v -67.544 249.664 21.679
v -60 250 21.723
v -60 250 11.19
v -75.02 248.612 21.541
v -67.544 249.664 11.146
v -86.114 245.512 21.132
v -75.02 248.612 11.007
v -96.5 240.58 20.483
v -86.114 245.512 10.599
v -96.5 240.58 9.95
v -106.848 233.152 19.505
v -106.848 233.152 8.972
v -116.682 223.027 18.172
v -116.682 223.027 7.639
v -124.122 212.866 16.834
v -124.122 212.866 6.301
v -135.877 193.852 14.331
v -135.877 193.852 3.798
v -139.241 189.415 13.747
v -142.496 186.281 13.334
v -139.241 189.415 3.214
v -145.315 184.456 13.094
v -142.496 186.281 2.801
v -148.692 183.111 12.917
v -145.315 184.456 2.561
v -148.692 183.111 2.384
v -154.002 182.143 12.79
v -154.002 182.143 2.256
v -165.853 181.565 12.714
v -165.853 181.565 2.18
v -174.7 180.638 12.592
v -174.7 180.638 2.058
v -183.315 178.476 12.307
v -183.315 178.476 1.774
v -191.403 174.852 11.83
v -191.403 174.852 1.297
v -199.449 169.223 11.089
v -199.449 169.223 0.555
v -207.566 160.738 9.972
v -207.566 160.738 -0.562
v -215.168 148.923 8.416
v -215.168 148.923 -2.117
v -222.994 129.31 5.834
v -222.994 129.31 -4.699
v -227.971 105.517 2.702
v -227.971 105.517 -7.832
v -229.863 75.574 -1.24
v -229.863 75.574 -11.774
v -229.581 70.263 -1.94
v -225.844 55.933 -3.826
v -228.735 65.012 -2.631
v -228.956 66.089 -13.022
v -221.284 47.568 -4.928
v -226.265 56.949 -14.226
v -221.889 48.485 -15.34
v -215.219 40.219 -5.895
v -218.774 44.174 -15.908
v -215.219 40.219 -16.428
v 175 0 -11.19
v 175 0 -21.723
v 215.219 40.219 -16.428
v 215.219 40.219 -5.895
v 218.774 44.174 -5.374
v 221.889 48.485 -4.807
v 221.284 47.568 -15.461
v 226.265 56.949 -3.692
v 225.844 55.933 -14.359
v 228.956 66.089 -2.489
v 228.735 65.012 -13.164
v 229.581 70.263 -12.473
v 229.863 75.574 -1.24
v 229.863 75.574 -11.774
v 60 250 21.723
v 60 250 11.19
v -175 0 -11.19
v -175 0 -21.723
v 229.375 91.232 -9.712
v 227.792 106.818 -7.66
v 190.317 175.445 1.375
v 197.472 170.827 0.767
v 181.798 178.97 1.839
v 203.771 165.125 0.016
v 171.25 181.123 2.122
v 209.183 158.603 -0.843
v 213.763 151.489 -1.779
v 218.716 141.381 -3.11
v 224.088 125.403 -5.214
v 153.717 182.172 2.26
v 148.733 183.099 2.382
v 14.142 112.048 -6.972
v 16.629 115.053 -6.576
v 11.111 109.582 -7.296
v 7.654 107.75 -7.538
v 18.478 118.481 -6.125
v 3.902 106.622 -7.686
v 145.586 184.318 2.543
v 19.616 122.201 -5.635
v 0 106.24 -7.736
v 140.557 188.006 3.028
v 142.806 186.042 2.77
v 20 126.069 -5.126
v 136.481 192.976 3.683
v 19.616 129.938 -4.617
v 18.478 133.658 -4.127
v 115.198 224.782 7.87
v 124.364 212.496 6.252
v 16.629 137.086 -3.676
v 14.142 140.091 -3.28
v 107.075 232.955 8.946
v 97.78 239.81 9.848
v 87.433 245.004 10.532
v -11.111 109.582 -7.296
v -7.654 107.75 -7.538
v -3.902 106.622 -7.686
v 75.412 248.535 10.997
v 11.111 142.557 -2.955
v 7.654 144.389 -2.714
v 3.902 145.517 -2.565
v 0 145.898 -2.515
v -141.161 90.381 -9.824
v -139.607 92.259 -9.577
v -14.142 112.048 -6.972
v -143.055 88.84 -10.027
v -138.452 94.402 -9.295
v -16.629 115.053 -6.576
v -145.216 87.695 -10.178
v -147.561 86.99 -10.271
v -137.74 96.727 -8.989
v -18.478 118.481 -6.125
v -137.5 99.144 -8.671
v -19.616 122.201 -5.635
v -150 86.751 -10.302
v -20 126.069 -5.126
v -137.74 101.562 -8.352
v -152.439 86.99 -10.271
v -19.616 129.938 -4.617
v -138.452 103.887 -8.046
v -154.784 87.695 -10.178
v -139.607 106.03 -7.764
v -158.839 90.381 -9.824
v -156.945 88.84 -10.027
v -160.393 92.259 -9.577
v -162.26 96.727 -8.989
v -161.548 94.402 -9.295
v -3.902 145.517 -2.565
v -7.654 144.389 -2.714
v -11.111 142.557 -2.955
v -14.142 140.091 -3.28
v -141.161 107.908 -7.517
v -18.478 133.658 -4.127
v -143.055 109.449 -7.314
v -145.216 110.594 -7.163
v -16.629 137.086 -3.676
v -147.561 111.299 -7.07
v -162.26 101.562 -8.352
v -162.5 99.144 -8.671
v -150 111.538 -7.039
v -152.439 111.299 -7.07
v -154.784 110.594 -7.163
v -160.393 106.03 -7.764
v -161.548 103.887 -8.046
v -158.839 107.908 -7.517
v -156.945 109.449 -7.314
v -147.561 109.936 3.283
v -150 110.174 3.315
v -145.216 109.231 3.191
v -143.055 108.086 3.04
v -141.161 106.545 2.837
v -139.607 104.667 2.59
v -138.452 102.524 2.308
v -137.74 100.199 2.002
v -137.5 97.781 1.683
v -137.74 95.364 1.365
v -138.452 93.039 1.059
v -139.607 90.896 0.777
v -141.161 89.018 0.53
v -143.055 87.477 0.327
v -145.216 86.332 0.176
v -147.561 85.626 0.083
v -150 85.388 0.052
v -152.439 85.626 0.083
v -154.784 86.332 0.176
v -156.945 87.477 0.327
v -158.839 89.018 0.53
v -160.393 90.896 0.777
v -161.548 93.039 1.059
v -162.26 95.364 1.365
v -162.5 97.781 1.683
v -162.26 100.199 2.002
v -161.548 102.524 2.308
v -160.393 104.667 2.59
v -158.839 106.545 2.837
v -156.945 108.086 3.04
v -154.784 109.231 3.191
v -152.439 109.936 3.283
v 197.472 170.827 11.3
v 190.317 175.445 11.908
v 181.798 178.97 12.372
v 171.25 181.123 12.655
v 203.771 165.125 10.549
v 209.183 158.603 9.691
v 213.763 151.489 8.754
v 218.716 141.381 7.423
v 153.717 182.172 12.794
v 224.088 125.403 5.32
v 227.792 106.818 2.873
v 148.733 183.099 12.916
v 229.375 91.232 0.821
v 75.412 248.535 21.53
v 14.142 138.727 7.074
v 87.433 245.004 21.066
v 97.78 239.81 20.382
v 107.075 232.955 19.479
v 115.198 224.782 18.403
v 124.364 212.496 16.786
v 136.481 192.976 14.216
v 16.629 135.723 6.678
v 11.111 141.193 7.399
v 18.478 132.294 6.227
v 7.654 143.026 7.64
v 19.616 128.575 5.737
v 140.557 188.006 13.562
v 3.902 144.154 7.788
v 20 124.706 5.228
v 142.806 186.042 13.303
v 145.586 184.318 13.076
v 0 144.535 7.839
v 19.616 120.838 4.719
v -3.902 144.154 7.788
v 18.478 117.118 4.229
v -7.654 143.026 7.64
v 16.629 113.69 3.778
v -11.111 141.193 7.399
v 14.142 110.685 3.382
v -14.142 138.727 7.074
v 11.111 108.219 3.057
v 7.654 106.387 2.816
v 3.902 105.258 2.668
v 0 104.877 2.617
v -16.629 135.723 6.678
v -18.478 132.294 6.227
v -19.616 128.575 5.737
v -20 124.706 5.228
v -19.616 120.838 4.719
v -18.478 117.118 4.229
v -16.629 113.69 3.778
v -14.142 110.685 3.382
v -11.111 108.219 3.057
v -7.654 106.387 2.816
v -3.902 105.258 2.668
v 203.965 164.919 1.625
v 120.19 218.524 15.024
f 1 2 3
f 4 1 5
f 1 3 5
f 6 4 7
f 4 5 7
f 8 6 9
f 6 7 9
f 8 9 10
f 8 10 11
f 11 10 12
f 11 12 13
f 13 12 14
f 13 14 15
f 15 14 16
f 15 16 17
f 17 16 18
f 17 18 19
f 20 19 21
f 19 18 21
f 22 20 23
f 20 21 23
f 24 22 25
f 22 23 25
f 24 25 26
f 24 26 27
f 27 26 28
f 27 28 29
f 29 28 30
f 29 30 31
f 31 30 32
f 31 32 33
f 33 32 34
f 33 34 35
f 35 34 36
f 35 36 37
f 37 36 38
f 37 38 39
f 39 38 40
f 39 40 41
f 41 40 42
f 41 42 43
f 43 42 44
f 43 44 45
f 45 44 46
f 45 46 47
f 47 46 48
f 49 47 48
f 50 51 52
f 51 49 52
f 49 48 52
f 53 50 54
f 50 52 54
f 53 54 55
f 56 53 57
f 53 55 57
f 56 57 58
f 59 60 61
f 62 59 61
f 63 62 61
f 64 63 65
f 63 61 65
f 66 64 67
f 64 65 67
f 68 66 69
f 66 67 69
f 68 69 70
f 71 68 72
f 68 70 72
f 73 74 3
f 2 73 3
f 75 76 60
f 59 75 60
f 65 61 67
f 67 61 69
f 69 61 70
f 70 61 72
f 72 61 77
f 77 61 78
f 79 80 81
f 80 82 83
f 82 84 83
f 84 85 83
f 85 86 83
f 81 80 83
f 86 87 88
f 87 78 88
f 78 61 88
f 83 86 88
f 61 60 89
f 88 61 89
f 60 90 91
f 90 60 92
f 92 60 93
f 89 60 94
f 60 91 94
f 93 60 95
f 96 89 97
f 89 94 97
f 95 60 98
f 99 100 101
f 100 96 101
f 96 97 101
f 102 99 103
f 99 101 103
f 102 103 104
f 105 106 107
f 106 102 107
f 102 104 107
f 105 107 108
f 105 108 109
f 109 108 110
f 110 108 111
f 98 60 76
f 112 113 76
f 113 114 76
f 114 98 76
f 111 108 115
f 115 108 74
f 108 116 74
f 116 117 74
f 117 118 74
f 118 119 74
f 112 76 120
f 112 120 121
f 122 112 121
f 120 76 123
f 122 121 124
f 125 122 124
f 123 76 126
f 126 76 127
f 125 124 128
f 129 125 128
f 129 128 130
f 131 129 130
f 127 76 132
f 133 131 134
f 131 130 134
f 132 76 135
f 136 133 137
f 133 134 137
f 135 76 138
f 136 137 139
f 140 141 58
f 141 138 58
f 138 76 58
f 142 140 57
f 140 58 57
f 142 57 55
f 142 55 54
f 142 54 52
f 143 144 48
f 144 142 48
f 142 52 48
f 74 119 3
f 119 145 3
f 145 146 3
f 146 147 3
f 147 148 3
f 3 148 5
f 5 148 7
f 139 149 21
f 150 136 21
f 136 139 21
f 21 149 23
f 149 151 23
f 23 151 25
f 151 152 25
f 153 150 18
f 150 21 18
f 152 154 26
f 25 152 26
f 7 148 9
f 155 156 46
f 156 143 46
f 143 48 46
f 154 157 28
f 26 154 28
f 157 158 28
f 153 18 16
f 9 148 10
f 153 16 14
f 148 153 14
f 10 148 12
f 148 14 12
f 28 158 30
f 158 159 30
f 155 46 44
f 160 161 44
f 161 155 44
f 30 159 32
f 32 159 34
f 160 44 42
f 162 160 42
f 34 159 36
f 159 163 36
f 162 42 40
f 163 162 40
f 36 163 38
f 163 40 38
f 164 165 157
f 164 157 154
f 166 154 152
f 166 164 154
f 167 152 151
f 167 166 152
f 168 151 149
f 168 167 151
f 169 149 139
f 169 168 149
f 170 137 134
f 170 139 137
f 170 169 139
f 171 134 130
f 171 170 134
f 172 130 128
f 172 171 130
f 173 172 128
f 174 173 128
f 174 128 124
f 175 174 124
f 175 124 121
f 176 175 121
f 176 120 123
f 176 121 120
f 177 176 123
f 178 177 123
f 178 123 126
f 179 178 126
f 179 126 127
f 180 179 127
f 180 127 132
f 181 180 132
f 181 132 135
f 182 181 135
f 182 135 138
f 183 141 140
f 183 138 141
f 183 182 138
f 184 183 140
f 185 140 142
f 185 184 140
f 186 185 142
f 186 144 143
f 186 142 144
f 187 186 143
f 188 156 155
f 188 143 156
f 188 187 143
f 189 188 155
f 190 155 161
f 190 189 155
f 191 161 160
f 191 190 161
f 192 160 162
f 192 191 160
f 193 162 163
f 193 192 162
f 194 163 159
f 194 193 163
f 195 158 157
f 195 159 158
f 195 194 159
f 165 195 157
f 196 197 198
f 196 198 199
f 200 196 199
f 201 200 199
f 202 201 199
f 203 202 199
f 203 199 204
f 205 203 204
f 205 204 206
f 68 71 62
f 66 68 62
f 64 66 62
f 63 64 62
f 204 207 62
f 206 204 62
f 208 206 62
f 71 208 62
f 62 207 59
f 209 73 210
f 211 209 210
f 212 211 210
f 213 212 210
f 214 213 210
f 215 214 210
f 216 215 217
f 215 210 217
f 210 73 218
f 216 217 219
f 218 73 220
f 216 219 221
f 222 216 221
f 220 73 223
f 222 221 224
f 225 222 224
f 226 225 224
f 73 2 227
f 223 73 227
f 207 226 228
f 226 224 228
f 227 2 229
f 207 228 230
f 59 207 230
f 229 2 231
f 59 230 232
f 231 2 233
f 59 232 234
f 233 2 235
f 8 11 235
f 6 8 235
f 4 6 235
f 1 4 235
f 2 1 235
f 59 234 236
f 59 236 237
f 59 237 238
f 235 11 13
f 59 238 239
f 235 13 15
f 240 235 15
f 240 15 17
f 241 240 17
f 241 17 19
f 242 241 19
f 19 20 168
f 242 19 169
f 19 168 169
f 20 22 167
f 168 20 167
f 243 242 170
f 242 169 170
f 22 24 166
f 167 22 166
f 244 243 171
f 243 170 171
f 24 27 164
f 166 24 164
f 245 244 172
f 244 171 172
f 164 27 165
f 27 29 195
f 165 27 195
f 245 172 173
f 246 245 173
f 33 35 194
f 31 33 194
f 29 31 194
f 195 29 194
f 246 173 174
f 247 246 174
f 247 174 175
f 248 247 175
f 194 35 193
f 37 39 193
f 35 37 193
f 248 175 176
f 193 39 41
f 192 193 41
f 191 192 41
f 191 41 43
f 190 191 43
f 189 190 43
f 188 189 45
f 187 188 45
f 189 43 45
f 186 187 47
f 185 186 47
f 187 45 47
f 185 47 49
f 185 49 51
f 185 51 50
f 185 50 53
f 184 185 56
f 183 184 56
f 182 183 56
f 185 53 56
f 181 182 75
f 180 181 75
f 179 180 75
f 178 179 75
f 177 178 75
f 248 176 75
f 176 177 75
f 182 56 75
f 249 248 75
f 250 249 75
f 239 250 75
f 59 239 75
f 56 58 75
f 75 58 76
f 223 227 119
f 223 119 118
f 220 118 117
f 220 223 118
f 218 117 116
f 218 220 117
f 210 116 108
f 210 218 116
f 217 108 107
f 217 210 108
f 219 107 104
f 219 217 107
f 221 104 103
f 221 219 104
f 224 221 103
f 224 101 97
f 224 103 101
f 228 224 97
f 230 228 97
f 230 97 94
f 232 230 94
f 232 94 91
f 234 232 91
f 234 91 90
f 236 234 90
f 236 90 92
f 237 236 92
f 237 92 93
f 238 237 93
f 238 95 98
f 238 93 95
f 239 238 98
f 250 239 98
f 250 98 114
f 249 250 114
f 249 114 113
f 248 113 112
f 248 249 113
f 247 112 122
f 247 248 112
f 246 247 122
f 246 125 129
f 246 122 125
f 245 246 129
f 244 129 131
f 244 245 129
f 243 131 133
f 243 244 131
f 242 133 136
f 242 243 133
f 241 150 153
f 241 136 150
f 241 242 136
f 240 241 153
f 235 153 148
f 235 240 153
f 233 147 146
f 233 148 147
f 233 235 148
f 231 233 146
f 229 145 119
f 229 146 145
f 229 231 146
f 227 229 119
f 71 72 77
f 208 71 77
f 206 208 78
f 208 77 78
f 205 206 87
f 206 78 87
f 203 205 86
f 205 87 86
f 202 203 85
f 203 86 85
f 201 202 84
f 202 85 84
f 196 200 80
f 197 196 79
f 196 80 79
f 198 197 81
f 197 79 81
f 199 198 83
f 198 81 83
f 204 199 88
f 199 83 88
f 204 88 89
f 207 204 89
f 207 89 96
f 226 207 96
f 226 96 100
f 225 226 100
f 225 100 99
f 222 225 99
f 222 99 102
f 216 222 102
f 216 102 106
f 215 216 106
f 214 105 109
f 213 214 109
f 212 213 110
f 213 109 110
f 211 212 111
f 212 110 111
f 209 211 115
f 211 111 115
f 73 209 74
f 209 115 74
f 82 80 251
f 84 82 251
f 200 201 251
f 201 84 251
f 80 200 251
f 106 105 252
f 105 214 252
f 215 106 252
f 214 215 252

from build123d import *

# Parameters (mm, degrees)
BOSS_EXTRUDE1_START     = -25
BOSS_EXTRUDE1_DEPTH     = 50
CUT_EXTRUDE1_DEPTH      = 341.53226913
CUT_EXTRUDE1_DEPTH_BACK = 341.53226913
CUT_EXTRUDE2_DEPTH      = 341.286795308
CUT_EXTRUDE2_DEPTH_BACK = 341.286795308
SKETCH4_R               = 20
CUT_EXTRUDE3_DEPTH      = 341.286795308
CUT_EXTRUDE3_DEPTH_BACK = 341.286795308
SKETCH6_R               = 12.5


# Read off the part's stored shape, not the designer's step: Boss-Extrude1
with BuildPart() as part:
    # Boss-Extrude1 outline → Boss-Extrude1 (new body)
    with BuildSketch(Plane.XY.offset(BOSS_EXTRUDE1_START)):
        with BuildLine():
            Line((175, 0), (215.218833807, 40.218833807))
            ThreePointArc((215.218833807, 40.218833807), (226.057471223, 56.440000887), (229.863494748, 75.574172084))
            add(Edge.make_bspline(
                [(229.863494748, 75.574172084), (229.863497015, 220.574172084), (130.657195822, 208), (130.657198498, 108), (160, 250), (60, 250)],
                knots=[0, 0, 0, 0, 0, 0, 1, 1, 1, 1, 1, 1], degree=5))
            Line((60, 250), (-60, 250))
            add(Edge.make_bspline(
                [(-60, 250), (-160, 250), (-130.657198498, 108), (-130.657195822, 208), (-229.863497015, 220.574172084), (-229.863494748, 75.574172084)],
                knots=[0, 0, 0, 0, 0, 0, 1, 1, 1, 1, 1, 1], degree=5))
            ThreePointArc((-229.863494748, 75.574172084), (-226.057471223, 56.440000887), (-215.218833807, 40.218833807))
            Line((-215.218833807, 40.218833807), (-175, 0))
            Line((-175, 0), (175, 0))
        make_face()
    extrude(amount=BOSS_EXTRUDE1_DEPTH)

    # Sketch2 → Cut-Extrude1 (cut, two sides: drawn at the far end of the back side and taken through both)
    with BuildSketch(Plane(origin=(0, 0, 0), x_dir=(0, 0, -1), z_dir=(1, 0, 0)).offset(-CUT_EXTRUDE1_DEPTH_BACK)):
        Polygon((23.039732542, -10), (-12.506441807, 260), (35, 260), (35, -10), align=None)
        Polygon((-23.039732542, 260), (12.506441807, -10), (-35, -10), (-35, 260), align=None)
    extrude(amount=CUT_EXTRUDE1_DEPTH + CUT_EXTRUDE1_DEPTH_BACK, mode=Mode.SUBTRACT)

    # Sketch4 → Cut-Extrude2 (cut, two sides: drawn at the far end of the back side and taken through both)
    with BuildSketch(Plane(origin=(0, 2.811189919, -21.353107392), x_dir=(-1, 0, 0), z_dir=(0, 0.13052619222005532, -0.99144486137381)).offset(-CUT_EXTRUDE2_DEPTH_BACK)):
        with Locations(Location((0, 124.321792579, 0), (0, 0, 90))):
            Circle(SKETCH4_R)
    extrude(amount=CUT_EXTRUDE2_DEPTH + CUT_EXTRUDE2_DEPTH_BACK, mode=Mode.SUBTRACT)

    # Sketch6 → Cut-Extrude3 (cut, two sides: drawn at the far end of the back side and taken through both)
    with BuildSketch(Plane(origin=(0, 2.811189919, -21.353107392), x_dir=(-1, 0, 0), z_dir=(0, 0.13052619222005532, -0.99144486137381)).offset(-CUT_EXTRUDE3_DEPTH_BACK)):
        with Locations(Location((150, 97.164552434, 0), (0, 0, 90))):
            Circle(SKETCH6_R)
    extrude(amount=CUT_EXTRUDE3_DEPTH + CUT_EXTRUDE3_DEPTH_BACK, mode=Mode.SUBTRACT)


solid = part.part
